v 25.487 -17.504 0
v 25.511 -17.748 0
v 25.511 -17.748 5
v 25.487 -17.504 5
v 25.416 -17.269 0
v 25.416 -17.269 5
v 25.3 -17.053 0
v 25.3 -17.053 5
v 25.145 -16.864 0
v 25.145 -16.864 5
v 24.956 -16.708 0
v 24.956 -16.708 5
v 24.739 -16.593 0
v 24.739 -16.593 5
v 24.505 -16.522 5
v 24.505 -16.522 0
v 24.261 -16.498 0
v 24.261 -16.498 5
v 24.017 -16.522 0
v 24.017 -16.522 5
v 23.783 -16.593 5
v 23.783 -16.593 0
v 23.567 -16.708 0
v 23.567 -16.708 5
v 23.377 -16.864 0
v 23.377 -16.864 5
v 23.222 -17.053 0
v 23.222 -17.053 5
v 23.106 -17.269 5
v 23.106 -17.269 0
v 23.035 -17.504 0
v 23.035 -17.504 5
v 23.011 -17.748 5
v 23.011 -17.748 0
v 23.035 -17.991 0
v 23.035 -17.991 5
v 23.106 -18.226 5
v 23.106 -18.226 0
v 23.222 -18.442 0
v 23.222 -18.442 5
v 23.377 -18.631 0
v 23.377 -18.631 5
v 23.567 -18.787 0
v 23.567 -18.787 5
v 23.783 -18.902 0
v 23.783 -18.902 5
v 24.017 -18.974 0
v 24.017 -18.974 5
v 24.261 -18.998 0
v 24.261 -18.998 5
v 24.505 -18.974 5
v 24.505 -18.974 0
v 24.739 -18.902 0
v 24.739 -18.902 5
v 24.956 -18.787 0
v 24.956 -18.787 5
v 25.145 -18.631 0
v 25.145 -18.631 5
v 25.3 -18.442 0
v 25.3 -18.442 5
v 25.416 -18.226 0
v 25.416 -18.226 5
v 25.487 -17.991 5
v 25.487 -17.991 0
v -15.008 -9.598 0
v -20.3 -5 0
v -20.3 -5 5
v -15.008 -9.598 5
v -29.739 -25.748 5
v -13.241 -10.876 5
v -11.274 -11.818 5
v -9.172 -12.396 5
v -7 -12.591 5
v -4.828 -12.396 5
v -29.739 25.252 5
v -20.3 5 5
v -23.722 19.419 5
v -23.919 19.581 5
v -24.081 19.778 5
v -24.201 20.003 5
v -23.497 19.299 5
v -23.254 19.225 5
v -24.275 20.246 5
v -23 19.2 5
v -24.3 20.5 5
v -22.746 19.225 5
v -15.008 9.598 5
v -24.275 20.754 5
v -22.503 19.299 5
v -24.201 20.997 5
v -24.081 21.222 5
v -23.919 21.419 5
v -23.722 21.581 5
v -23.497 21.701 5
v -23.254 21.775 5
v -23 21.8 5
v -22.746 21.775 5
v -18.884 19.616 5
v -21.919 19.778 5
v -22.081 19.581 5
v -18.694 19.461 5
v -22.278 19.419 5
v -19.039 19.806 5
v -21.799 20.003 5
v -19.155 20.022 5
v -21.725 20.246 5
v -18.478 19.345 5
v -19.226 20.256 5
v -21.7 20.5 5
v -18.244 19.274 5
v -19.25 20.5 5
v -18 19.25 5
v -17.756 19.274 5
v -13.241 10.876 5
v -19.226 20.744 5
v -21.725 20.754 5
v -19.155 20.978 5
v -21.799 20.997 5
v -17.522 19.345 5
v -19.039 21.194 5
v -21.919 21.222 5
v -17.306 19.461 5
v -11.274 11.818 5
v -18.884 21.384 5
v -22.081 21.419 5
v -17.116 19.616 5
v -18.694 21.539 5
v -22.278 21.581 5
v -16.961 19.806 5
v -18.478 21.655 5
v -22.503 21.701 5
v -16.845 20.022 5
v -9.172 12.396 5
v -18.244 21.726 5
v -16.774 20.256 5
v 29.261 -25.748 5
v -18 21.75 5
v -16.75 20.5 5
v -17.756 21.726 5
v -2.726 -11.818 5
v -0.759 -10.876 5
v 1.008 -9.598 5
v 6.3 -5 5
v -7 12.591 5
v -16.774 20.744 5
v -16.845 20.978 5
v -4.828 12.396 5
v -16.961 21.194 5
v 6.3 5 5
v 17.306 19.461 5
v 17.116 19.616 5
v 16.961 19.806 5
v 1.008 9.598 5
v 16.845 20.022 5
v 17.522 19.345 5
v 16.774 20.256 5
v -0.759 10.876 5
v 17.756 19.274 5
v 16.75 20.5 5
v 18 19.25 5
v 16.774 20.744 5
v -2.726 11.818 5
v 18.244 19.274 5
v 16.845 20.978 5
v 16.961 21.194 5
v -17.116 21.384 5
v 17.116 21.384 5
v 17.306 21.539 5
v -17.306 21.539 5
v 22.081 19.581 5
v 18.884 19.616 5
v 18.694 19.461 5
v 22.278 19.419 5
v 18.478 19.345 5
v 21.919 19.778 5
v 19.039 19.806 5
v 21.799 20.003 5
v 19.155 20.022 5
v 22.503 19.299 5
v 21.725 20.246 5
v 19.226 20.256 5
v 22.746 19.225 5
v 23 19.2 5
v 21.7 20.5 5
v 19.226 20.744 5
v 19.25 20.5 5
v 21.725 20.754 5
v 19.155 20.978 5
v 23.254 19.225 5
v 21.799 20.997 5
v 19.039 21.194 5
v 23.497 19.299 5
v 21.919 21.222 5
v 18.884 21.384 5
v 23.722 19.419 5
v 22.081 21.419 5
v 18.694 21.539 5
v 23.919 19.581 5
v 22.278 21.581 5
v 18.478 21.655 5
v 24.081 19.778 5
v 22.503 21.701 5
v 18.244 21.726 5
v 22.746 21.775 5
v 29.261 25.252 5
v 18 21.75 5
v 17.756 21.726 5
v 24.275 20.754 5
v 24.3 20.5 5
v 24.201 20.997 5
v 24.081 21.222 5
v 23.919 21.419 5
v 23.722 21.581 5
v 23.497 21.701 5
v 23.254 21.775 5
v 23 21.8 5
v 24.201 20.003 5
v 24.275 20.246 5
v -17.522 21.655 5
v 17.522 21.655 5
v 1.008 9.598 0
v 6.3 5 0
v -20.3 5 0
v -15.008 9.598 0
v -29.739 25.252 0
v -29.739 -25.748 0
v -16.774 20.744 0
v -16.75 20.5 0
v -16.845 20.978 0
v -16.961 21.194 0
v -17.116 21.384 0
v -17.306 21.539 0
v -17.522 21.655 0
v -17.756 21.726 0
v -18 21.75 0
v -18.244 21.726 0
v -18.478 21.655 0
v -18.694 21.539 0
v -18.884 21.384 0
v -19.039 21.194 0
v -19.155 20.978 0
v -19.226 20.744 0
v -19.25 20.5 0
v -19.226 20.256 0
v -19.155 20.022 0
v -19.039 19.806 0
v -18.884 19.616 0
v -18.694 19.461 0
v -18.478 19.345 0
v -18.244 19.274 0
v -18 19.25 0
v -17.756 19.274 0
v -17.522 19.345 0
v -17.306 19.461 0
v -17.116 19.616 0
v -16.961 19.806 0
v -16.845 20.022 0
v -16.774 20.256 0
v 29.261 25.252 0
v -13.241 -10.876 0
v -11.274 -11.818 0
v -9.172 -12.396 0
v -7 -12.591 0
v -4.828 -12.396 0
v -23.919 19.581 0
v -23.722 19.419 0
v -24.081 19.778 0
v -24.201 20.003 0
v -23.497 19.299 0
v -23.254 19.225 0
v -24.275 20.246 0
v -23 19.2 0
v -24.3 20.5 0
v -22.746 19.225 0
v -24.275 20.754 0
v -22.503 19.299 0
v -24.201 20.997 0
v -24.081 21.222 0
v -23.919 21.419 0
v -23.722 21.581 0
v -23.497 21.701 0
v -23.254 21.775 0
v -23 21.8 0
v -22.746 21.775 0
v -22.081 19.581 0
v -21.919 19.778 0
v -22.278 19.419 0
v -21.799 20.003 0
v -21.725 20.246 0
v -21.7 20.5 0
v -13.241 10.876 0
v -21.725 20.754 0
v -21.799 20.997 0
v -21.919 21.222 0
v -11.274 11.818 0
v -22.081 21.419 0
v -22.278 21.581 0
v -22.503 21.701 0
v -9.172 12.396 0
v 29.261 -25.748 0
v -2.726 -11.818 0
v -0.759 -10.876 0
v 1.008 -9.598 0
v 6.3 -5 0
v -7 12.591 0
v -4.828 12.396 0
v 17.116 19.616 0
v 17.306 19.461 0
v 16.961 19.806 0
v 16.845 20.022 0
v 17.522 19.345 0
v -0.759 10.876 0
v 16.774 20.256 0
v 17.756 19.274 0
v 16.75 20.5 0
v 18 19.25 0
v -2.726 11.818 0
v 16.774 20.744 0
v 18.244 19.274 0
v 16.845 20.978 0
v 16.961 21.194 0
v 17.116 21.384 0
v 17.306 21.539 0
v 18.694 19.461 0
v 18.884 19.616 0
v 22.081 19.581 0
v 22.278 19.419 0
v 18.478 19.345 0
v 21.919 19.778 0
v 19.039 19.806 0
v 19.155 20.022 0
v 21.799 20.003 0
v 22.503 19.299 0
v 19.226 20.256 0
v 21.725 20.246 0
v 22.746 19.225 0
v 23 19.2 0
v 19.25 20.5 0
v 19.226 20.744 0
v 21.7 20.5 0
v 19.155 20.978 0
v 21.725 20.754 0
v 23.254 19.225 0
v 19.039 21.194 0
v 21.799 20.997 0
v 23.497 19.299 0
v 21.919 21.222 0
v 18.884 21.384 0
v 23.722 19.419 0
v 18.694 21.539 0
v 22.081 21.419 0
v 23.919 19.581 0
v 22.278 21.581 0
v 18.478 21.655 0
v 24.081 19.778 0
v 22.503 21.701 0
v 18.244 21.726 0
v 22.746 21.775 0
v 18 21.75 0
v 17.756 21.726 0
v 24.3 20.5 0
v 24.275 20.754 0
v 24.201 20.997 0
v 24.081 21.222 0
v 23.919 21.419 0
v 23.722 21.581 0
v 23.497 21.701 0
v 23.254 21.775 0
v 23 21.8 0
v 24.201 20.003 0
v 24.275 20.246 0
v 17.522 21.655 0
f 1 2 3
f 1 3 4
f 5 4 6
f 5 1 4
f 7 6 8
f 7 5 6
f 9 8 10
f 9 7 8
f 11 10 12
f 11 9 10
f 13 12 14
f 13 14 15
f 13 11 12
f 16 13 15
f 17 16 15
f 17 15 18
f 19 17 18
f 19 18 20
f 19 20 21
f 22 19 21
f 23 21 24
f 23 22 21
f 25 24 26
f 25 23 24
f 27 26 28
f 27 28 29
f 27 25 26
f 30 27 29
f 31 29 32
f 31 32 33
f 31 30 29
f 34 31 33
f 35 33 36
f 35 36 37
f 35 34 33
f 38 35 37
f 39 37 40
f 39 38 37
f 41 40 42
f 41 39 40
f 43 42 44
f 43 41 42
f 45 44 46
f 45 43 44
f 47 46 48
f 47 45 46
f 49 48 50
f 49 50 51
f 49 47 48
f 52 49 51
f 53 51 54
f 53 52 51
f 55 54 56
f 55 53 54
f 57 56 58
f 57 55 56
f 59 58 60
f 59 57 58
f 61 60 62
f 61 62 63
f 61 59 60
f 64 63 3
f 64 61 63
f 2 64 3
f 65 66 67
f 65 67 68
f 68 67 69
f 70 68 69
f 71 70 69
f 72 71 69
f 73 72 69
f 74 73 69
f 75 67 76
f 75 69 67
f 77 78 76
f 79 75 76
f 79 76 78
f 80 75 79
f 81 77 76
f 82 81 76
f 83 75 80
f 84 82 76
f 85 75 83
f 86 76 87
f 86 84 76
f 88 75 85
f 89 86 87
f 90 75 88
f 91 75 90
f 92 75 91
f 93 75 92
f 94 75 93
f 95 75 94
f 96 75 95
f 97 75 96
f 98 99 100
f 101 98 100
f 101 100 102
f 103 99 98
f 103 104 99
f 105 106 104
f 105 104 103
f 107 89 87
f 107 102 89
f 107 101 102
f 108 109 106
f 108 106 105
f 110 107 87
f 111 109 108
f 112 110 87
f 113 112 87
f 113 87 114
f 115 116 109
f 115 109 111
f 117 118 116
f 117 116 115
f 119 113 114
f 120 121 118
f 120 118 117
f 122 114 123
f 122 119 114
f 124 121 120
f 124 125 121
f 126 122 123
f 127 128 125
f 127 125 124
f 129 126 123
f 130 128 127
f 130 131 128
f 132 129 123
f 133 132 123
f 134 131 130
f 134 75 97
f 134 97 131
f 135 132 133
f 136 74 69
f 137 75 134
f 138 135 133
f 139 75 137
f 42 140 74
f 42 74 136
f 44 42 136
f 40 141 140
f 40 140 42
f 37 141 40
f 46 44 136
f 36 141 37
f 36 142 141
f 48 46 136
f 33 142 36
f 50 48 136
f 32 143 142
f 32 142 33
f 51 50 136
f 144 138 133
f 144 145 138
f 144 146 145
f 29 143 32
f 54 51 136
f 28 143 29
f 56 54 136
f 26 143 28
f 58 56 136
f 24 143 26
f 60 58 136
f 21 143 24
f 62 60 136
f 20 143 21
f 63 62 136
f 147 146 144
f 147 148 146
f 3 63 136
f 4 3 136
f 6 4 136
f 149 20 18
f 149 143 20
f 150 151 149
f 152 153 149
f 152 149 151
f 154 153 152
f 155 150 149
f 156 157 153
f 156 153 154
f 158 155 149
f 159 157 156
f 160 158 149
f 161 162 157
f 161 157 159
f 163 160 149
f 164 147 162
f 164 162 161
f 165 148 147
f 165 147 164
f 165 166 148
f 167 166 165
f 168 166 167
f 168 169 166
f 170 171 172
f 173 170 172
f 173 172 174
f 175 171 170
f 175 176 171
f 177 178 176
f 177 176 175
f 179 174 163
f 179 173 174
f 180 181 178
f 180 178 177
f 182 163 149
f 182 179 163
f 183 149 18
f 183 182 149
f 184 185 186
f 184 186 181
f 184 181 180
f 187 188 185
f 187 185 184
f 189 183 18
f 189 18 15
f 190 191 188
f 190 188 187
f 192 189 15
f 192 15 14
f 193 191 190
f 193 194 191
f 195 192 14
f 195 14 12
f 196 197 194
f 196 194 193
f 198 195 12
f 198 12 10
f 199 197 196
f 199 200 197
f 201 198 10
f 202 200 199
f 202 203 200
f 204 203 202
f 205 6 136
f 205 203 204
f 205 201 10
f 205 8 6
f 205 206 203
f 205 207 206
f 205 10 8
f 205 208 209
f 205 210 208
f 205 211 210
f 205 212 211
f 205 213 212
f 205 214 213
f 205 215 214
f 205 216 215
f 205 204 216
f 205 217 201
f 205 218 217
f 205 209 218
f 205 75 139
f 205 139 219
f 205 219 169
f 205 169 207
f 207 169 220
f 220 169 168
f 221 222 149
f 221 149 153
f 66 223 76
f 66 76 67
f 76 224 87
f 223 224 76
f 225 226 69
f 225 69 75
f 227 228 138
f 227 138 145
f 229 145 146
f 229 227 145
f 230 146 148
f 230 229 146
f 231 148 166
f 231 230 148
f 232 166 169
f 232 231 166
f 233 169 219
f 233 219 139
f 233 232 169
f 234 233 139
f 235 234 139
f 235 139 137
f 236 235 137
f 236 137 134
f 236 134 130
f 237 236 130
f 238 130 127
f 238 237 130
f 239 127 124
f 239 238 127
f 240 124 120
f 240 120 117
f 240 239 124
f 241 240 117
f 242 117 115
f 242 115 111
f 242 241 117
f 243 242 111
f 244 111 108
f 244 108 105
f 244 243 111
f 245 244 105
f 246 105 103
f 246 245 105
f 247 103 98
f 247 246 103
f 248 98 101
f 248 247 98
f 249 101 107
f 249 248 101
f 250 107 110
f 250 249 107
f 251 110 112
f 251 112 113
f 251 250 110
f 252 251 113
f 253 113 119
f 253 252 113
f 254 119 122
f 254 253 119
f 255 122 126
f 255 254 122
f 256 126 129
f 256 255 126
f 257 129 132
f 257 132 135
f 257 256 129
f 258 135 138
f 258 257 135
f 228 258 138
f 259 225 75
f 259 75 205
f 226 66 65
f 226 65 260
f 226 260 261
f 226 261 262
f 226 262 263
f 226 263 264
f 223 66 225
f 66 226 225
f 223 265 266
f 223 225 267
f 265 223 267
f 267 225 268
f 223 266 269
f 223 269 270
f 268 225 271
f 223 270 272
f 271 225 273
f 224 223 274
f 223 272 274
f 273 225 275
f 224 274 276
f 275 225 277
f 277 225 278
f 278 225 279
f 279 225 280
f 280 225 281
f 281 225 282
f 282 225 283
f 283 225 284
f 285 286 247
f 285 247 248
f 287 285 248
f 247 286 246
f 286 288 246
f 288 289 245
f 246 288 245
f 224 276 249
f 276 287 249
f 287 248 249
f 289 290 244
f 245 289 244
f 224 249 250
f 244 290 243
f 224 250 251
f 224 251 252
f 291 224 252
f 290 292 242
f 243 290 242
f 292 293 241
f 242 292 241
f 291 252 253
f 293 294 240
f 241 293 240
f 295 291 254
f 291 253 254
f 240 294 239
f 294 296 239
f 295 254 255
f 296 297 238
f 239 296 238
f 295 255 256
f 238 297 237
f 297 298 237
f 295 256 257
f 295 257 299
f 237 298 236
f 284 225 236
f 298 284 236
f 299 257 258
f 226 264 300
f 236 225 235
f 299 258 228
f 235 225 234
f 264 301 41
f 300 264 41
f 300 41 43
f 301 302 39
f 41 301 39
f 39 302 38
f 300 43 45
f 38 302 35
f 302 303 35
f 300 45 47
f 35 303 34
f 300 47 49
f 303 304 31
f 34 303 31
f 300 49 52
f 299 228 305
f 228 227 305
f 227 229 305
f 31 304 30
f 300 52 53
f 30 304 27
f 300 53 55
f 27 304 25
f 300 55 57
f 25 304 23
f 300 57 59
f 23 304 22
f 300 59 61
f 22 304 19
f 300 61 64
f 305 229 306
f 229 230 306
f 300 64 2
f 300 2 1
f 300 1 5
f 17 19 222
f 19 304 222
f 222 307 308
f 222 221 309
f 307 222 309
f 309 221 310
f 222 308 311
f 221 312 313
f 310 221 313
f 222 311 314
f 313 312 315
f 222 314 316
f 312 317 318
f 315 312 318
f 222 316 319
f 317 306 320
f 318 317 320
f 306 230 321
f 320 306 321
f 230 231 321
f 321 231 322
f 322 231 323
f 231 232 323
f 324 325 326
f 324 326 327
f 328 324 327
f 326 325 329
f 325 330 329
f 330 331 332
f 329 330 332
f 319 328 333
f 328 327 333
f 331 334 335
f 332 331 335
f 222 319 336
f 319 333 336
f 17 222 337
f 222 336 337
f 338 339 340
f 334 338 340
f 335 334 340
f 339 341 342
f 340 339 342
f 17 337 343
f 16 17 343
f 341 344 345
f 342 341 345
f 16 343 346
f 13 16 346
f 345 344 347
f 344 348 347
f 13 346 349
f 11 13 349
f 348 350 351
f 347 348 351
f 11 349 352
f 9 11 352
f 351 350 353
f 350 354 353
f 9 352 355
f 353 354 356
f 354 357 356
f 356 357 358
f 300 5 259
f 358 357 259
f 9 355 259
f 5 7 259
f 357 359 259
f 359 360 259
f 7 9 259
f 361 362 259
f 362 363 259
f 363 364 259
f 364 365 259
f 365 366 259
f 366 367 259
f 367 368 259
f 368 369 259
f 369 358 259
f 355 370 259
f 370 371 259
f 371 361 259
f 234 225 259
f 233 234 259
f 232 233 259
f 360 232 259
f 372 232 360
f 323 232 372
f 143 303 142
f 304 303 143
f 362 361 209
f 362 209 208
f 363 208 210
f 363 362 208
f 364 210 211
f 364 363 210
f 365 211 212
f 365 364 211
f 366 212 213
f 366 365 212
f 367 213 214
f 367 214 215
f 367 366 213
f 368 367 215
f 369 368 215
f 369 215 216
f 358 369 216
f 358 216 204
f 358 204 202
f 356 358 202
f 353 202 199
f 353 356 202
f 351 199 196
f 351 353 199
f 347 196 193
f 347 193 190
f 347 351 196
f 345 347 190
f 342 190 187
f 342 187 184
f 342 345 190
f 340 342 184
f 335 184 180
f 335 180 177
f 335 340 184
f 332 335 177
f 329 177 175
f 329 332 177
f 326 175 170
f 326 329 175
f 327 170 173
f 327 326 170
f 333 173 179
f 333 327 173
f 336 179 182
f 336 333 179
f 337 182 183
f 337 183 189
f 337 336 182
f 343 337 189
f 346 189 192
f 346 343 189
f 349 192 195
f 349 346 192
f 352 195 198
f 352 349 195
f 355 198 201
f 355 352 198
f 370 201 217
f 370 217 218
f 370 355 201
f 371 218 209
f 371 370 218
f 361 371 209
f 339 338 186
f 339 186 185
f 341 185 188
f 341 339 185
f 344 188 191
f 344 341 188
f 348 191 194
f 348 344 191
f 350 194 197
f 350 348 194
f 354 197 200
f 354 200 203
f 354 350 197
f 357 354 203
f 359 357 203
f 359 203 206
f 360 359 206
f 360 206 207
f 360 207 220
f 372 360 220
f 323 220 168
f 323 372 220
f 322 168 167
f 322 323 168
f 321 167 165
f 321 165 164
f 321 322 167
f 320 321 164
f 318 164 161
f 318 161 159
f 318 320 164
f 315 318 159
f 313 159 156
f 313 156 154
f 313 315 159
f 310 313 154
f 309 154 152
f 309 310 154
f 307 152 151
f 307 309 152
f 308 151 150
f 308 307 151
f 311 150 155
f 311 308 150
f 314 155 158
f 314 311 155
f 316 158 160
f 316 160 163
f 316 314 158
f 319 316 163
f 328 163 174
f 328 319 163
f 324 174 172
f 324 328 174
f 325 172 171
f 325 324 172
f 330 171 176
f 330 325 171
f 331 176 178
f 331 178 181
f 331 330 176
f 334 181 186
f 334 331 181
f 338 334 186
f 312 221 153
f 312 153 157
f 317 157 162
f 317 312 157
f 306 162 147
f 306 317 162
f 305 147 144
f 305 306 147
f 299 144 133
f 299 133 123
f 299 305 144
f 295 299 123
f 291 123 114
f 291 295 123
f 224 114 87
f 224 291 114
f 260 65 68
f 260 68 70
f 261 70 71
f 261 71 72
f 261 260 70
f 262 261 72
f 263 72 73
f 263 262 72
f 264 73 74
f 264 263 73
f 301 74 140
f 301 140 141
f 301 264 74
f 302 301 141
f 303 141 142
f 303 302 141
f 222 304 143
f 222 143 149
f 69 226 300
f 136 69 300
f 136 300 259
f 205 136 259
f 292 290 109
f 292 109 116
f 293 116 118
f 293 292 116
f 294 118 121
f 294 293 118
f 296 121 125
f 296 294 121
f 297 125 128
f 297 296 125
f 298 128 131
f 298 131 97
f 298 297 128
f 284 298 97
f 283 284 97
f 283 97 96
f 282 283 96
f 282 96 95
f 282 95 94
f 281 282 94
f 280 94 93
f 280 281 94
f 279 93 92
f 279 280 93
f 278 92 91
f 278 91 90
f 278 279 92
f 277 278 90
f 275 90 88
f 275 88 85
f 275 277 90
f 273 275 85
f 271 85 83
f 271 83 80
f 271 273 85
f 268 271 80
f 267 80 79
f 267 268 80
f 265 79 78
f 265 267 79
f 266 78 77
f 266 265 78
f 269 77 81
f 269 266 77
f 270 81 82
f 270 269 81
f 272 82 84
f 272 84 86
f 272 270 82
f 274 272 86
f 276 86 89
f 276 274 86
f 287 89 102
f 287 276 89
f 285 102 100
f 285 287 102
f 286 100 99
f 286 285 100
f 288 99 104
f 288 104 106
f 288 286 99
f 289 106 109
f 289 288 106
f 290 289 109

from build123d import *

# Parameters (mm, degrees)
CROQUIS1_W              = 59
CROQUIS1_H              = 51
CROQUIS1_R              = 1.25
CROQUIS1_R_2            = 1.3
SALIENTE_EXTRUIR1_DEPTH = 5


with BuildPart() as part:
    # Croquis1 → Saliente-Extruir1 (new body)
    with BuildSketch(Plane.XY):
        with Locations((-0.238863052, -0.247607665)):
            Rectangle(CROQUIS1_W, CROQUIS1_H)
        with Locations((24.261136948, -17.747607665)):
            Circle(CROQUIS1_R, mode=Mode.SUBTRACT)
        with Locations((-18, 20.5)):
            Circle(CROQUIS1_R, mode=Mode.SUBTRACT)
        with Locations((18, 20.5)):
            Circle(CROQUIS1_R, mode=Mode.SUBTRACT)
        with Locations((-23, 20.5)):
            Circle(CROQUIS1_R_2, mode=Mode.SUBTRACT)
        with Locations((23, 20.5)):
            Circle(CROQUIS1_R_2, mode=Mode.SUBTRACT)
        with BuildLine():
            Line((-20.3, 5), (-20.3, -5))
            Line((-20.3, -5), (-15.007684576, -9.598280457))
            ThreePointArc((-15.007684576, -9.598280457), (-7, -12.591121267), (1.007684576, -9.598280457))
            Line((1.007684576, -9.598280457), (6.3, -5))
            Line((6.3, -5), (6.3, 5))
            Line((6.3, 5), (1.007684576, 9.598280457))
            ThreePointArc((1.007684576, 9.598280457), (-7, 12.591121267), (-15.007684576, 9.598280457))
            Line((-15.007684576, 9.598280457), (-20.3, 5))
        make_face(mode=Mode.SUBTRACT)
    extrude(amount=SALIENTE_EXTRUIR1_DEPTH)


solid = part.part
